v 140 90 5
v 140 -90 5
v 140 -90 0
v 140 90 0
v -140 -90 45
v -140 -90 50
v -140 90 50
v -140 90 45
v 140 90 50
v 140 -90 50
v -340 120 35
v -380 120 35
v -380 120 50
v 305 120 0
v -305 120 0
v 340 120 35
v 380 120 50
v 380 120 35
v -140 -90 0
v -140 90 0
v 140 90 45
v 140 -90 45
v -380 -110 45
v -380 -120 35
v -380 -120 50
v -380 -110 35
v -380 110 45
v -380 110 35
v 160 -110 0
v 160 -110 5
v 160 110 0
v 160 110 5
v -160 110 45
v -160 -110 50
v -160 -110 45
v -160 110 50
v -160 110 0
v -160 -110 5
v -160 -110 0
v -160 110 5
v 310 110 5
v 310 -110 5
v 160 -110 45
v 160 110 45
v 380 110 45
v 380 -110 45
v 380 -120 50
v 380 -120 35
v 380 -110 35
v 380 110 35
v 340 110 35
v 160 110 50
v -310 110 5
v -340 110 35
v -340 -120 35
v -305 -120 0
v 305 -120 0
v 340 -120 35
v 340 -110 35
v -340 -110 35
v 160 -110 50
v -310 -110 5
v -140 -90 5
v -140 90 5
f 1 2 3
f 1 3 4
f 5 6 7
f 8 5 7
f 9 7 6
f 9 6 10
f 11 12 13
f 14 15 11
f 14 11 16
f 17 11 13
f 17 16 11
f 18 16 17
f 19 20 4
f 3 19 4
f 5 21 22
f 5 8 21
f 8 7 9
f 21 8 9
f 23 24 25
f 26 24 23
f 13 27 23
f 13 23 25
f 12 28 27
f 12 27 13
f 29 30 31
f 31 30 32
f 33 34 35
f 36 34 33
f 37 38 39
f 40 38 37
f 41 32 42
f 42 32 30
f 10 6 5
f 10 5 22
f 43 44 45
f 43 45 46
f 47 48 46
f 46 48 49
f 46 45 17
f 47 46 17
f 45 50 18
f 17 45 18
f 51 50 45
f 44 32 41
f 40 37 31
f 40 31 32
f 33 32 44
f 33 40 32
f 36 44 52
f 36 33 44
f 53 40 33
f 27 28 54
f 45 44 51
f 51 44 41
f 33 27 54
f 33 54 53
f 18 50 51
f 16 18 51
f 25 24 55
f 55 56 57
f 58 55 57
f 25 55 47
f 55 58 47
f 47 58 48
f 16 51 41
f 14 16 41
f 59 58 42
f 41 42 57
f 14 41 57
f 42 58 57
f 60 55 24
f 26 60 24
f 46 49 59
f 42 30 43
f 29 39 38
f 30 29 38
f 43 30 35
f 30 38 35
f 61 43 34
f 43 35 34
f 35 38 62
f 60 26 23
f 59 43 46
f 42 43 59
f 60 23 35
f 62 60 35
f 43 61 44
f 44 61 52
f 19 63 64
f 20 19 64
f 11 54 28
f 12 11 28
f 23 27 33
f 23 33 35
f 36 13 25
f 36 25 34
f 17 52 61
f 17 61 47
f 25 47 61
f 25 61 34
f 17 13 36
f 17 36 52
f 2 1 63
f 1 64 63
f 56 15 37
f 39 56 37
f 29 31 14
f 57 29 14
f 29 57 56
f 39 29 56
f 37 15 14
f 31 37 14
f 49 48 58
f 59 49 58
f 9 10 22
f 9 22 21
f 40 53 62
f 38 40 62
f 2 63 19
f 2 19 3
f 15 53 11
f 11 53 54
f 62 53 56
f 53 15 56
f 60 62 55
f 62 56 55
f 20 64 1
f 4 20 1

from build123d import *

# Parameters (mm, degrees)
F0_W     = 760
F0_H     = 240
F1_DEPTH = 50
F3_W     = 220
F3_H     = 40
F4_DEPTH = 760
F5_DEPTH = 240
F6_W     = 319.999992
F6_H     = 220
F6_W_2   = 280
F6_H_2   = 180
F7_DEPTH = 50


with BuildPart() as f1:
    # F0 (on Top) → F1 (new body)
    with BuildSketch(Plane.XY):
        Rectangle(F0_W, F0_H)
    extrude(amount=F1_DEPTH)

    # F3 (on face) → F4 (cut)
    with BuildSketch(Plane(origin=(-380, 0, 0), x_dir=(0, -1, 0), z_dir=(-1, 0, 0))):
        with Locations((0, 25)):
            Rectangle(F3_W, F3_H)
    extrude(amount=-F4_DEPTH, mode=Mode.SUBTRACT)

    # F2 (on face) → F5 (cut)
    with BuildSketch(Plane.XZ.offset(120)):
        Polygon((340, 35), (305, 0), (380, 0), (380, 35), align=None)
        Polygon((-340, 35), (-380, 35), (-380, 0), (-305, 0), align=None)
    extrude(amount=-F5_DEPTH, mode=Mode.SUBTRACT)

    # F6 (on face) → F7 (cut)
    with BuildSketch(Plane.XY.offset(50)):
        Rectangle(F6_W, F6_H)
        Rectangle(F6_W_2, F6_H_2, mode=Mode.SUBTRACT)
    extrude(amount=-F7_DEPTH, mode=Mode.SUBTRACT)


solid = f1.part
